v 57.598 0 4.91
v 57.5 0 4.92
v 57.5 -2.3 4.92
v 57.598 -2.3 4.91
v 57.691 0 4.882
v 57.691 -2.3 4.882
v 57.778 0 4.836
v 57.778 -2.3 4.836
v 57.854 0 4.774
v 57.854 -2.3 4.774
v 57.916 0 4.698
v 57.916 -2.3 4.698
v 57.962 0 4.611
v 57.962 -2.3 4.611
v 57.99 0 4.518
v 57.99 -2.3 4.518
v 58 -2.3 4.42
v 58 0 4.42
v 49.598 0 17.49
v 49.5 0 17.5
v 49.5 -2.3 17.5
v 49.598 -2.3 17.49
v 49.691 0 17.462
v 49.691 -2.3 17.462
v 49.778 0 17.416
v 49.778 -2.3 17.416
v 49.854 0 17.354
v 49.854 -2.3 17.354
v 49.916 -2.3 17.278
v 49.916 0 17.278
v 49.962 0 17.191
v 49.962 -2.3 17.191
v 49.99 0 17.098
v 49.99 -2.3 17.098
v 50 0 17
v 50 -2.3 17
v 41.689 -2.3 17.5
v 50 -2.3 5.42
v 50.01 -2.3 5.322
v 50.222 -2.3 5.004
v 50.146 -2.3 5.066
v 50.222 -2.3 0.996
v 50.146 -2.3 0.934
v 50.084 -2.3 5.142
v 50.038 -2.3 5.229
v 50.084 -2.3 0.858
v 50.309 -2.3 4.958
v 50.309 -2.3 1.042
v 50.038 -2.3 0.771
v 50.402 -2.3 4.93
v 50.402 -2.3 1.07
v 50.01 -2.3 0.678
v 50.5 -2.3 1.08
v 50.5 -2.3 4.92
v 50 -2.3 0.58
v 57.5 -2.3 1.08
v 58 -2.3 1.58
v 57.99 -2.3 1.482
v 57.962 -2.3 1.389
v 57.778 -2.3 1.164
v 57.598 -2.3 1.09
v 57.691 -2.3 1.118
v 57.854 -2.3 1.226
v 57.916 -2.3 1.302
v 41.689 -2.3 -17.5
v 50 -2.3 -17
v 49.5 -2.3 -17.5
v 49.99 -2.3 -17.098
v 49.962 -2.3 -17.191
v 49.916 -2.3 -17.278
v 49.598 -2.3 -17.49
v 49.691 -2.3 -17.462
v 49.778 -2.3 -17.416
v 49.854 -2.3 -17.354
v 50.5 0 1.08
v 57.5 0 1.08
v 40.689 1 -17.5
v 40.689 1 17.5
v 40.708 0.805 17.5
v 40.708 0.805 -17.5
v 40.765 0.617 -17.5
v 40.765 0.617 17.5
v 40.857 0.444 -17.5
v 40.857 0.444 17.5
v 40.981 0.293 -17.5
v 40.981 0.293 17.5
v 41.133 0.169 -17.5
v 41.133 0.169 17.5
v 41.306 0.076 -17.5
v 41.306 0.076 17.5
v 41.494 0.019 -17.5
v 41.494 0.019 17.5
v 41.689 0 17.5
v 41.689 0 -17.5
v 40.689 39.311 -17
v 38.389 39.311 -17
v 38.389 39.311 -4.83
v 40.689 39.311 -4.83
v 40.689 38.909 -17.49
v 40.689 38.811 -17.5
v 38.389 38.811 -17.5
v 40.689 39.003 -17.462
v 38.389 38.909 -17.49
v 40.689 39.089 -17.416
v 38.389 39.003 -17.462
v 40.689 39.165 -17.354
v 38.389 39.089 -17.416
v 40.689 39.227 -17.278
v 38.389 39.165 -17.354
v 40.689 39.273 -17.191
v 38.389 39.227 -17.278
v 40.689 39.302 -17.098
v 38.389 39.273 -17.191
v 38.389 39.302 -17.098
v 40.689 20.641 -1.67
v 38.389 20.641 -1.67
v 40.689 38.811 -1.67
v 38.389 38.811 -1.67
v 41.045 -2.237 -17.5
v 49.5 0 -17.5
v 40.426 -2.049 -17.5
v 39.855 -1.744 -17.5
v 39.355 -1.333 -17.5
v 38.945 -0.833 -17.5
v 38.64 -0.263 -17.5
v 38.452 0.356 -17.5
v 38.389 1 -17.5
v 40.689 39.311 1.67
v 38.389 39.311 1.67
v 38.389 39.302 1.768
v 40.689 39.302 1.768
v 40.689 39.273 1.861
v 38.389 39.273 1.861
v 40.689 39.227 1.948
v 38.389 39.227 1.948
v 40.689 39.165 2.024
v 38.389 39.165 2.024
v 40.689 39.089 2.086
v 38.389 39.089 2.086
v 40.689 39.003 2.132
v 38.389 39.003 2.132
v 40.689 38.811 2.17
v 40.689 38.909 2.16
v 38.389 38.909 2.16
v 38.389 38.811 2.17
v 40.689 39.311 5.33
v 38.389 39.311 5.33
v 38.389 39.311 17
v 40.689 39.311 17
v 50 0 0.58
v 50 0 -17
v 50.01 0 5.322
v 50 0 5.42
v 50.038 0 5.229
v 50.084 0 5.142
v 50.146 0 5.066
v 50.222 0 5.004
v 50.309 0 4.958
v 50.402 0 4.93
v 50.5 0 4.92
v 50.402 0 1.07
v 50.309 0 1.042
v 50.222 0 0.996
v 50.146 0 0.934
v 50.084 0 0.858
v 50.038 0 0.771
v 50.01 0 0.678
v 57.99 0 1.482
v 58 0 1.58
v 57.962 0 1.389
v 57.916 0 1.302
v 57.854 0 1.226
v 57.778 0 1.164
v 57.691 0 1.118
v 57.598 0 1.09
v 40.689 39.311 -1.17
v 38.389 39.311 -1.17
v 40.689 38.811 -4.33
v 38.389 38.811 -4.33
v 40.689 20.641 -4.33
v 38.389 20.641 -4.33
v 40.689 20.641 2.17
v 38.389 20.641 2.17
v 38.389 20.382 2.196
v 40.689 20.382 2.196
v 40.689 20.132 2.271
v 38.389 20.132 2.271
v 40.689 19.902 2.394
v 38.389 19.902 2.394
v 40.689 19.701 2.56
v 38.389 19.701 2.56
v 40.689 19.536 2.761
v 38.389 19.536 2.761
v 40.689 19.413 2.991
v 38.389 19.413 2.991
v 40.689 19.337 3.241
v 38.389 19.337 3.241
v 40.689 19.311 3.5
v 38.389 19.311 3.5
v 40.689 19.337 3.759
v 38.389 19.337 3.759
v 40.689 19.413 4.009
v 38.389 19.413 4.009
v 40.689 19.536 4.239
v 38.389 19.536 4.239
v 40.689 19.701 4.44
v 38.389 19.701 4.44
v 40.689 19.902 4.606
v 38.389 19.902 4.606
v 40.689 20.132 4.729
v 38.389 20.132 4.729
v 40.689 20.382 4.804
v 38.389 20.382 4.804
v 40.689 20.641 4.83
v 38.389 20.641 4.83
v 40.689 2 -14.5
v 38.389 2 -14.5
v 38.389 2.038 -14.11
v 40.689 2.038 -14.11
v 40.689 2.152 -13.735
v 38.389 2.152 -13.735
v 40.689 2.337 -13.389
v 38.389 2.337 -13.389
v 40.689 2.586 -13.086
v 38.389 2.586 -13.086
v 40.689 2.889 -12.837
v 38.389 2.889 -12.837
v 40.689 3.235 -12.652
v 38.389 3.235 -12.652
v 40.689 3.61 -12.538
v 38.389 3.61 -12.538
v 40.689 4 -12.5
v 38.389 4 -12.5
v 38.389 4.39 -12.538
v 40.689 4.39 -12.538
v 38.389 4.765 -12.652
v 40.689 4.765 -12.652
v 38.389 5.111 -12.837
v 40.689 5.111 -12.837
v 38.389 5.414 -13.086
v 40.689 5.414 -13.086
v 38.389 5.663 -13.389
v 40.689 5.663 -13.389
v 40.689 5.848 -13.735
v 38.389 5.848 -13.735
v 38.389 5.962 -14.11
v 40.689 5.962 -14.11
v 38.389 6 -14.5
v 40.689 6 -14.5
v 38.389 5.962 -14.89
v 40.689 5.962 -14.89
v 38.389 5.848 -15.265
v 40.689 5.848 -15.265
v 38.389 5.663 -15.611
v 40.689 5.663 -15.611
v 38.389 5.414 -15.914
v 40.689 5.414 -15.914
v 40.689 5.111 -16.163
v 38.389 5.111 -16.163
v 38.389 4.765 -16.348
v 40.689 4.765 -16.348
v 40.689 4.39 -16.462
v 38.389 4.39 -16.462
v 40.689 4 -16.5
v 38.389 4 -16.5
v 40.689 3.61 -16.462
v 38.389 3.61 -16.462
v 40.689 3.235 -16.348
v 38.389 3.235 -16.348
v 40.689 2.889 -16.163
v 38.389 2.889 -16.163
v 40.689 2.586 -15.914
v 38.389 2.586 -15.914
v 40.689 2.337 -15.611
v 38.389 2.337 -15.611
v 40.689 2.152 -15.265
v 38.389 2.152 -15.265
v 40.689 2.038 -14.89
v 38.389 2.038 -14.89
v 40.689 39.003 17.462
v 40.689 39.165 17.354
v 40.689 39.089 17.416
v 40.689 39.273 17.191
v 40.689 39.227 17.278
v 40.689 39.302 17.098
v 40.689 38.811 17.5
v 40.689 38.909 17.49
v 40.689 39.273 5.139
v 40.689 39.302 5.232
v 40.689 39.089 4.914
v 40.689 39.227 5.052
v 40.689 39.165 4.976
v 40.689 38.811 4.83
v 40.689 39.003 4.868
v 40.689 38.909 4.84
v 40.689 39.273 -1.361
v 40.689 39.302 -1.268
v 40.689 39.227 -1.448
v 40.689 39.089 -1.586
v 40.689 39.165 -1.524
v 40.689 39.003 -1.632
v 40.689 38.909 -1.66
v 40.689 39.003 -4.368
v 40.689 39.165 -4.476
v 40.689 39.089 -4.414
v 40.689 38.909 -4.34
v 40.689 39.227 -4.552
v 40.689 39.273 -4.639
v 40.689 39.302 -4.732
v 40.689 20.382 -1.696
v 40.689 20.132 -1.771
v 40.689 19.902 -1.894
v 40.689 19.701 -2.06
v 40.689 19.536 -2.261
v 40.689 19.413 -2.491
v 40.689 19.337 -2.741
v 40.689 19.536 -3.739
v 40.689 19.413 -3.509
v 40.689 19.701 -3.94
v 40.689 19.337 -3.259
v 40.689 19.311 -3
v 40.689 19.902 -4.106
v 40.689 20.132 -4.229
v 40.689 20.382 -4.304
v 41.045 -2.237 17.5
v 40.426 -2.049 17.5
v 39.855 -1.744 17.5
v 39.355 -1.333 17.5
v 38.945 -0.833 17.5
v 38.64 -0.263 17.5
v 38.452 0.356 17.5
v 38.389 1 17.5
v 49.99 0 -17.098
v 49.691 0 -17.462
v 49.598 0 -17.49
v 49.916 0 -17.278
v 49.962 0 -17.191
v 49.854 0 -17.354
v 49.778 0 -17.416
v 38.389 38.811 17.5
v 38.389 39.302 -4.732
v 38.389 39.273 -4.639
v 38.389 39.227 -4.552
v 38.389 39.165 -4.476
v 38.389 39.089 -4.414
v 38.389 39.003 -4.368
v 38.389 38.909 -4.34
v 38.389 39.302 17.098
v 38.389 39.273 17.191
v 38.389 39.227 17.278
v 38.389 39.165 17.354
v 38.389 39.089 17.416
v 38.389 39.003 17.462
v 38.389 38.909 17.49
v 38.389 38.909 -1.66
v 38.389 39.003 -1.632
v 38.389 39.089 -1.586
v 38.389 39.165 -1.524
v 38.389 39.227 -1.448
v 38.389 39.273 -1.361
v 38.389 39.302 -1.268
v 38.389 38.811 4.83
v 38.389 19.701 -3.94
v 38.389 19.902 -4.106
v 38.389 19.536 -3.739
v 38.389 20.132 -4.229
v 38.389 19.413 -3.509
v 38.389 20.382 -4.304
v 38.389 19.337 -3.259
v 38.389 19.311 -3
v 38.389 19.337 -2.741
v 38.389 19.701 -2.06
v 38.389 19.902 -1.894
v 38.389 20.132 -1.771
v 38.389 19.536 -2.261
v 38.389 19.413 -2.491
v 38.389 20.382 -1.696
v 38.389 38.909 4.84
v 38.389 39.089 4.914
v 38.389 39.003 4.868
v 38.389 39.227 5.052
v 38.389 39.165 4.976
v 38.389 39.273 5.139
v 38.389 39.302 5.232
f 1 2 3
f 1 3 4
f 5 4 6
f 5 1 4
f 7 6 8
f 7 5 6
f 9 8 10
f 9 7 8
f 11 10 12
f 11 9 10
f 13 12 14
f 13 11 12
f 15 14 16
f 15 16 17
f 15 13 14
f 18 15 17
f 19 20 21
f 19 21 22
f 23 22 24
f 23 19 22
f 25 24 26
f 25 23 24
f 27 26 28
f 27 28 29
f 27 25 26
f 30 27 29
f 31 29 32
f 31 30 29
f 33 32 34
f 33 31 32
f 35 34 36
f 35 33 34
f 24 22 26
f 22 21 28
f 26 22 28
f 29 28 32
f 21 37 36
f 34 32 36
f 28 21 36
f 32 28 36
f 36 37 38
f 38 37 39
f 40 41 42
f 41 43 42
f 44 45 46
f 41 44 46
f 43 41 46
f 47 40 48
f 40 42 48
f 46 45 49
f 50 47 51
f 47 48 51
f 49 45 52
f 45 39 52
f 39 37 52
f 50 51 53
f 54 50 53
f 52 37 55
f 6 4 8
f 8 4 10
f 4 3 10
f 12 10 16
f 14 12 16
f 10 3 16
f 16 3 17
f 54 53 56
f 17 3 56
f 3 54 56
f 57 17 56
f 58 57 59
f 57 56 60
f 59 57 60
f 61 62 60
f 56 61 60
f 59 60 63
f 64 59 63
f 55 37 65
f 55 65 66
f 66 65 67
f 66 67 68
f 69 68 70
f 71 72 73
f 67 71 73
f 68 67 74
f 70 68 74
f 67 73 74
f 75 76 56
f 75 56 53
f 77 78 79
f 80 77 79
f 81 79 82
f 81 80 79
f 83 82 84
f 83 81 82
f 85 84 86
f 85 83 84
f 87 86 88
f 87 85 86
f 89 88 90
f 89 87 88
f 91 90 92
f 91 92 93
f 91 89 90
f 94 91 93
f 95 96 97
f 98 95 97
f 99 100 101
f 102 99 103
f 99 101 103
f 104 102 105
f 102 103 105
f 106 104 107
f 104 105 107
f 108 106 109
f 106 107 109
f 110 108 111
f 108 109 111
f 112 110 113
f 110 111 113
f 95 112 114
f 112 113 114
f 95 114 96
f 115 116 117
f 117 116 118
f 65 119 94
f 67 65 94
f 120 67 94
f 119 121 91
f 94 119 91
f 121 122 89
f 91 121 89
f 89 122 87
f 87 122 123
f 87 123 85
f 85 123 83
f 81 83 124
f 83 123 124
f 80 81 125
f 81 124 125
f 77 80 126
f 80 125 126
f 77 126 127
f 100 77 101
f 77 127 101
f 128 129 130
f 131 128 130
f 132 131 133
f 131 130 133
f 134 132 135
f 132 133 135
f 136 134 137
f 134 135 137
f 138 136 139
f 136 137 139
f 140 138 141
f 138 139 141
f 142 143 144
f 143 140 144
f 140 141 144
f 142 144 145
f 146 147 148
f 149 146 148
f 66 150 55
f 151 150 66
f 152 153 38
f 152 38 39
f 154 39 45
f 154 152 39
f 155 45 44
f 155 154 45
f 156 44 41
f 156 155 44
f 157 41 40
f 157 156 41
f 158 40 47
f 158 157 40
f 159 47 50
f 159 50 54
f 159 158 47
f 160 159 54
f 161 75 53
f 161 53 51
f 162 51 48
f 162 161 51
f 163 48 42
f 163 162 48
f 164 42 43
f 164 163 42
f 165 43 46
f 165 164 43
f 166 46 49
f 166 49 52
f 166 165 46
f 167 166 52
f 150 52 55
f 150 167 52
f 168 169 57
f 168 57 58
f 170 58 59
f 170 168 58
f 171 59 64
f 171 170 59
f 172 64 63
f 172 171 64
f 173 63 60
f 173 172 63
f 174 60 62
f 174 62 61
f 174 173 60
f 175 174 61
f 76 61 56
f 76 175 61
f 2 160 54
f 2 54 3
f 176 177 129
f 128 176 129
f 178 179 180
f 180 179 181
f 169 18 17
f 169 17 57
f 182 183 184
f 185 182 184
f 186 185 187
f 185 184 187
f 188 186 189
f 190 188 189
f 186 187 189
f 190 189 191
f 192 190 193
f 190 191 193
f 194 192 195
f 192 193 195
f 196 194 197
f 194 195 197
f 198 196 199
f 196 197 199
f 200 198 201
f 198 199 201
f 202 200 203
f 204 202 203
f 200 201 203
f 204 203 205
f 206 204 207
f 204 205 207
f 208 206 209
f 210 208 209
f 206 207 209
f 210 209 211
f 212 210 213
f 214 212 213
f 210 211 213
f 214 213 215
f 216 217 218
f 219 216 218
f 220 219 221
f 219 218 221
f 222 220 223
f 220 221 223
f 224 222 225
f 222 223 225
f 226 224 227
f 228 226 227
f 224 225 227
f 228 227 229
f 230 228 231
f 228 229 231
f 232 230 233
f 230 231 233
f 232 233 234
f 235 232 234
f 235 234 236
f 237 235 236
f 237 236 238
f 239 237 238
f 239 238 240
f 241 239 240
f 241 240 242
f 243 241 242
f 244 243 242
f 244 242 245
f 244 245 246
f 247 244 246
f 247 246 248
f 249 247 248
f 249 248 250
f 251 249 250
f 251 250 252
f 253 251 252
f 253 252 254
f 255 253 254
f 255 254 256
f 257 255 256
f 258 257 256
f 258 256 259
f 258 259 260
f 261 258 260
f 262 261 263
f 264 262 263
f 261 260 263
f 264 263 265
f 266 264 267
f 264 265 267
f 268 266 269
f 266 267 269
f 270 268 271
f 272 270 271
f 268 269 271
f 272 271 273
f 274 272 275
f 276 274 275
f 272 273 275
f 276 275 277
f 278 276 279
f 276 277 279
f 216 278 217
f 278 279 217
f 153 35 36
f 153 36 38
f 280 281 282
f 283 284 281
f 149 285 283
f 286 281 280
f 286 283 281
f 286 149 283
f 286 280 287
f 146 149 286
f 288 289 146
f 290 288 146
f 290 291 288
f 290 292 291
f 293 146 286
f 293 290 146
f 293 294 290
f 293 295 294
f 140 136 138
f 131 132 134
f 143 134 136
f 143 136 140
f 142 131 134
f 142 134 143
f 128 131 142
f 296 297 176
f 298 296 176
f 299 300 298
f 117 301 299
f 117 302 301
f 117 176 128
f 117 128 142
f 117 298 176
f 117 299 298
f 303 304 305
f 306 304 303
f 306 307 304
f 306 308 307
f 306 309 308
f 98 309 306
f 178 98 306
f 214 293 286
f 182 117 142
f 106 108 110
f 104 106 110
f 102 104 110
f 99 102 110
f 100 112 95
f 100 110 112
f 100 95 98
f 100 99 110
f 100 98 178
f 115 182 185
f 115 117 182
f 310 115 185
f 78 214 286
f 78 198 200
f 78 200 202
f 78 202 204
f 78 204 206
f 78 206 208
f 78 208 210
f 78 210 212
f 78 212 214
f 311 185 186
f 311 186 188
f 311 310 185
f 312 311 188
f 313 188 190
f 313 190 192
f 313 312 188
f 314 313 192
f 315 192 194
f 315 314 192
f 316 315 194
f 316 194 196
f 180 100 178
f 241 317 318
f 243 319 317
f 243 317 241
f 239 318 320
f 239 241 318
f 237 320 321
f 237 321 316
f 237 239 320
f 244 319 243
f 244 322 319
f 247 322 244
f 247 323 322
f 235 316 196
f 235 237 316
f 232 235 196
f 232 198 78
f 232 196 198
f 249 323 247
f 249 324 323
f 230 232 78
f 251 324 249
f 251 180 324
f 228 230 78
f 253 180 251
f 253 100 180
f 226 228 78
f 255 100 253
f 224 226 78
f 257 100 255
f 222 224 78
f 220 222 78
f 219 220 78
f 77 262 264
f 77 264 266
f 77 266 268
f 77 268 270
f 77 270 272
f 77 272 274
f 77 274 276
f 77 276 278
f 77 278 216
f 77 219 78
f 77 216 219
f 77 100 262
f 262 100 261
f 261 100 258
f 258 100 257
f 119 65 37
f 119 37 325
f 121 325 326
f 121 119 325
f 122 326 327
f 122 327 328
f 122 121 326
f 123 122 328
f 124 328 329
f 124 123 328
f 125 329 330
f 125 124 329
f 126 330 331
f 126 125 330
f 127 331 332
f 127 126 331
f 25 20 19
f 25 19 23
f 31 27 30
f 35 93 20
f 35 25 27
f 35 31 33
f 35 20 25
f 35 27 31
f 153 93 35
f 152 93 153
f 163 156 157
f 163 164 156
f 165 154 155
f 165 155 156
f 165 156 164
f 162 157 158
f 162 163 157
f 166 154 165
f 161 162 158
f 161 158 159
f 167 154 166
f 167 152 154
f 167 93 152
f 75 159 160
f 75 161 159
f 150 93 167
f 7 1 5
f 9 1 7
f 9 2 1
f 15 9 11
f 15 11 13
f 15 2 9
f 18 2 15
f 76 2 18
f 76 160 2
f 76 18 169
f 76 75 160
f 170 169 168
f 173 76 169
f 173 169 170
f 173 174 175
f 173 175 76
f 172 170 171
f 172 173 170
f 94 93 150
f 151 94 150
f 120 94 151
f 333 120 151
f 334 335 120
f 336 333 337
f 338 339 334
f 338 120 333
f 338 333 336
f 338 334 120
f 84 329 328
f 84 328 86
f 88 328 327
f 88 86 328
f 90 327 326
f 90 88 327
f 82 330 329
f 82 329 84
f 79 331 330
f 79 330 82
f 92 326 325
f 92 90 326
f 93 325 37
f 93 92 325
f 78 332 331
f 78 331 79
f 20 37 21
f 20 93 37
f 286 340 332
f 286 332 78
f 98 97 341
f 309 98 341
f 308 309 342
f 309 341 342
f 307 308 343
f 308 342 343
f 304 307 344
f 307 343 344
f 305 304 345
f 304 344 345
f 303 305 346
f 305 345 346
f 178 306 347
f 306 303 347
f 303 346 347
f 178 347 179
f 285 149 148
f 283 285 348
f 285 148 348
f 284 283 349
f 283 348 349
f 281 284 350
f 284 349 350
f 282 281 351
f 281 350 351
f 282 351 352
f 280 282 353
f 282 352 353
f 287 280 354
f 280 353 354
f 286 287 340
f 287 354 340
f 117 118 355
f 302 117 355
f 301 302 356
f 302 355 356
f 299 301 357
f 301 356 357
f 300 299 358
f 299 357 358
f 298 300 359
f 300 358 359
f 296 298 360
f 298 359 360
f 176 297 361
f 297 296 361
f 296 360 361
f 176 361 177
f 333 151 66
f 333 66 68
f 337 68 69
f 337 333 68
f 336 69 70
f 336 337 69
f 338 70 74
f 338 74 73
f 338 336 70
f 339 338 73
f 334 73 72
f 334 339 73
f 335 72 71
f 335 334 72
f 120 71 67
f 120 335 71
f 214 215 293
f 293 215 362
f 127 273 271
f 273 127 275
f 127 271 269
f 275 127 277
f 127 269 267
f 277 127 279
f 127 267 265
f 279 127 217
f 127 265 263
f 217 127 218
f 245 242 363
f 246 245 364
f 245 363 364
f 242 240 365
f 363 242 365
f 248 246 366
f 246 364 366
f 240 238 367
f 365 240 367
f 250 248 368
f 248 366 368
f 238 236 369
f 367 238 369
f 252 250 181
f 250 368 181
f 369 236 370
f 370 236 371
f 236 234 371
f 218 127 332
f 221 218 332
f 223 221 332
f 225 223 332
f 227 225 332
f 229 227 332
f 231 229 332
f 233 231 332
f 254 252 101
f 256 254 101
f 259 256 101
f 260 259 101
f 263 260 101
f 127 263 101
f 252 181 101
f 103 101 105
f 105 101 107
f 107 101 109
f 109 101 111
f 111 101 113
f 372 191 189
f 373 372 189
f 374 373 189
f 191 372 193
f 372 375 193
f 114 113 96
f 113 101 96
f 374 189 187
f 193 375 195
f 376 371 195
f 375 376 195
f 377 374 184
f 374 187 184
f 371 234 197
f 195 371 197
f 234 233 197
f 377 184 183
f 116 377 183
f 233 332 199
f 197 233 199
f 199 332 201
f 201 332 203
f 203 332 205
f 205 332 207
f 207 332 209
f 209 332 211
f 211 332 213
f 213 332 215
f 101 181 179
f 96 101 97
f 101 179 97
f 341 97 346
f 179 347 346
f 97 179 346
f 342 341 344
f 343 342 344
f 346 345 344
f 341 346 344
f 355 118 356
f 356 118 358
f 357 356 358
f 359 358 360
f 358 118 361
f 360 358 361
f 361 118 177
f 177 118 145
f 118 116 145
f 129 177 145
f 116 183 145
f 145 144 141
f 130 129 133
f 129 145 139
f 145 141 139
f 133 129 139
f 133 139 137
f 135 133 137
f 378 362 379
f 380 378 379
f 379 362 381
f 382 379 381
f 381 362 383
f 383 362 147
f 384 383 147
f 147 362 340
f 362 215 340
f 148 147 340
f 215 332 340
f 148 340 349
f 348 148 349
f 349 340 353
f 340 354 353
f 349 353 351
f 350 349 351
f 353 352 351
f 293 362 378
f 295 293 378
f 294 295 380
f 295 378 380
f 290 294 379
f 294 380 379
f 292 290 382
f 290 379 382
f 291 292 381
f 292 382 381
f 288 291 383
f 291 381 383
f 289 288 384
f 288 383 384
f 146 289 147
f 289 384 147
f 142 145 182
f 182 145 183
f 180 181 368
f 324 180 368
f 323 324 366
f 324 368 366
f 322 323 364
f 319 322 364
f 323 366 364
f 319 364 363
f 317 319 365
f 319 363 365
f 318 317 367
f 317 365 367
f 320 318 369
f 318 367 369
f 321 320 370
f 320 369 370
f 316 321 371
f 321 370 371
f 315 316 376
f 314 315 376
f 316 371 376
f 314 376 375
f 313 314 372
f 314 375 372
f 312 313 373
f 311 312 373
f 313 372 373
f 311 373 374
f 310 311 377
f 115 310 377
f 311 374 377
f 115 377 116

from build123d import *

# Parameters (mm, degrees)
BASE_FLANGE1_DEPTH       = 2.3
SKETCHED_BEND1_OUTLINE_W = 2.3
SKETCHED_BEND1_OUTLINE_H = 35
SKETCHED_BEND1_DEPTH     = 38.388606051
SKETCHED_START           = 38.709564051
SKETCHED_BEND1_2_DEPTH   = 1.979042
SKETCHED_START_2         = 38.388606051
SKETCHED_BEND1_3_DEPTH   = 3.3
SKETCHED_START_3         = -17.5
SKETCHED_BEND1_4_DEPTH   = 35
SKETCH7_R                = 2
CUT_EXTRUDE1_DEPTH       = 10


with BuildPart() as part:
    # Base-Flange1: sheet metal written as solids
    # Sketch1 → Base-Flange1 (new body)
    with BuildSketch(Plane(origin=(0, 0, 0), x_dir=(1, 0, 0), z_dir=(0, 1, 0))):
        with BuildLine():
            Line((0, 17), (0, 4.83))
            ThreePointArc((0, 4.83), (0.146446609, 4.476446609), (0.5, 4.33))
            Line((0.5, 4.33), (18.67, 4.33))
            ThreePointArc((18.67, 4.33), (20, 3), (18.67, 1.67))
            Line((18.67, 1.67), (0.5, 1.67))
            ThreePointArc((0.5, 1.67), (0.146446609, 1.523553391), (0, 1.17))
            Line((0, 1.17), (0, -1.67))
            ThreePointArc((0, -1.67), (0.146446609, -2.023553391), (0.5, -2.17))
            Line((0.5, -2.17), (18.67, -2.17))
            ThreePointArc((18.67, -2.17), (20, -3.5), (18.67, -4.83))
            Line((18.67, -4.83), (0.5, -4.83))
            ThreePointArc((0.5, -4.83), (0.146446609, -4.976446609), (0, -5.33))
            Line((0, -5.33), (0, -17))
            ThreePointArc((0, -17), (0.146446609, -17.353553391), (0.5, -17.5))
            Line((0.5, -17.5), (49.5, -17.5))
            ThreePointArc((49.5, -17.5), (49.853553391, -17.353553391), (50, -17))
            Line((50, -17), (50, -5.42))
            ThreePointArc((50, -5.42), (50.146446609, -5.066446609), (50.5, -4.92))
            Line((50.5, -4.92), (57.5, -4.92))
            ThreePointArc((57.5, -4.92), (57.853553391, -4.773553391), (58, -4.42))
            Line((58, -4.42), (58, -1.58))
            ThreePointArc((58, -1.58), (57.853553391, -1.226446609), (57.5, -1.08))
            Line((57.5, -1.08), (50.5, -1.08))
            ThreePointArc((50.5, -1.08), (50.146446609, -0.933553391), (50, -0.58))
            Line((50, -0.58), (50, 17))
            ThreePointArc((50, 17), (49.853553391, 17.353553391), (49.5, 17.5))
            Line((49.5, 17.5), (0.5, 17.5))
            ThreePointArc((0.5, 17.5), (0.146446609, 17.353553391), (0, 17))
        make_face()
    extrude(amount=-BASE_FLANGE1_DEPTH)

    # Sketched Bend1: read off the stored shape, not the designer's step
    # Sketched Bend1 outline → Sketched Bend1 (cut)
    with BuildSketch(Plane.YZ):
        with Locations((-1.15, 0)):
            Rectangle(SKETCHED_BEND1_OUTLINE_W, SKETCHED_BEND1_OUTLINE_H)
    extrude(amount=SKETCHED_BEND1_DEPTH, mode=Mode.SUBTRACT)

    # Sketched Bend1 2 outline → Sketched Bend1 2 (add)
    with BuildSketch(Plane.YZ.offset(SKETCHED_START)):
        with BuildLine():
            Line((0, -17.5), (38.811393949, -17.5))
            ThreePointArc((38.811393949, -17.5), (39.164947339, -17.353553391), (39.311393949, -17))
            Line((39.311393949, -17), (39.311393949, -4.83))
            ThreePointArc((39.311393949, -4.83), (39.16494734, -4.476446609), (38.811393949, -4.33))
            Line((38.811393949, -4.33), (20.641393949, -4.33))
            ThreePointArc((20.641393949, -4.33), (19.311393949, -3), (20.641393949, -1.67))
            Line((20.641393949, -1.67), (38.811393949, -1.67))
            ThreePointArc((38.811393949, -1.67), (39.16494734, -1.523553391), (39.311393949, -1.17))
            Line((39.311393949, -1.17), (39.311393949, 1.67))
            ThreePointArc((39.311393949, 1.67), (39.16494734, 2.023553391), (38.811393949, 2.17))
            Line((38.811393949, 2.17), (20.641393949, 2.17))
            ThreePointArc((20.641393949, 2.17), (19.311393949, 3.5), (20.641393949, 4.83))
            Line((20.641393949, 4.83), (38.811393949, 4.83))
            ThreePointArc((38.811393949, 4.83), (39.16494734, 4.976446609), (39.311393949, 5.33))
            Line((39.311393949, 5.33), (39.311393949, 17))
            ThreePointArc((39.311393949, 17), (39.164947339, 17.353553391), (38.811393949, 17.5))
            Line((38.811393949, 17.5), (0, 17.5))
            Line((0, 17.5), (0, -17.5))
        make_face()
    extrude(amount=SKETCHED_BEND1_2_DEPTH)

    # Sketched Bend1 3 outline → Sketched Bend1 3 (add)
    with BuildSketch(Plane.YZ.offset(SKETCHED_START_2)):
        with BuildLine():
            Line((0, -17.5), (38.811393949, -17.5))
            ThreePointArc((38.811393949, -17.5), (39.164947339, -17.353553391), (39.311393949, -17))
            Line((39.311393949, -17), (39.311393949, -4.83))
            ThreePointArc((39.311393949, -4.83), (39.16494734, -4.476446609), (38.811393949, -4.33))
            Line((38.811393949, -4.33), (20.641393949, -4.33))
            ThreePointArc((20.641393949, -4.33), (19.311393949, -3), (20.641393949, -1.67))
            Line((20.641393949, -1.67), (38.811393949, -1.67))
            ThreePointArc((38.811393949, -1.67), (39.16494734, -1.523553391), (39.311393949, -1.17))
            Line((39.311393949, -1.17), (39.311393949, 1.67))
            ThreePointArc((39.311393949, 1.67), (39.16494734, 2.023553391), (38.811393949, 2.17))
            Line((38.811393949, 2.17), (20.641393949, 2.17))
            ThreePointArc((20.641393949, 2.17), (19.311393949, 3.5), (20.641393949, 4.83))
            Line((20.641393949, 4.83), (38.811393949, 4.83))
            ThreePointArc((38.811393949, 4.83), (39.16494734, 4.976446609), (39.311393949, 5.33))
            Line((39.311393949, 5.33), (39.311393949, 17))
            ThreePointArc((39.311393949, 17), (39.164947339, 17.353553391), (38.811393949, 17.5))
            Line((38.811393949, 17.5), (0, 17.5))
            Line((0, 17.5), (0, -17.5))
        make_face()
    extrude(amount=SKETCHED_BEND1_3_DEPTH)

    # Sketched Bend1 4 outline → Sketched Bend1 4 (cut)
    with BuildSketch(Plane.XY.offset(SKETCHED_START_3)):
        with BuildLine():
            Line((41.688606051, 39.311393949), (40.688606051, 39.311393949))
            Line((40.688606051, 39.311393949), (40.688606051, 1))
            ThreePointArc((40.688606051, 1), (40.98149927, 0.292893219), (41.688606051, 0))
            Line((41.688606051, 0), (41.688606051, 39.311393949))
        make_face()
        with BuildLine():
            ThreePointArc((41.688606051, -2.3), (39.355153673, -1.333452378), (38.388606051, 1))
            Line((38.388606051, 1), (38.388606051, -2.3))
            Line((38.388606051, -2.3), (41.688606051, -2.3))
        make_face()
    extrude(amount=SKETCHED_BEND1_4_DEPTH, mode=Mode.SUBTRACT)

    # Sketch7 → Cut-Extrude1 (cut)
    with BuildSketch(Plane.ZY.offset(-38.388606051)):
        with Locations(Location((-14.5, 4, 0), (0, 0, 270))):
            Circle(SKETCH7_R)
    extrude(amount=-CUT_EXTRUDE1_DEPTH, mode=Mode.SUBTRACT)


solid = part.part
